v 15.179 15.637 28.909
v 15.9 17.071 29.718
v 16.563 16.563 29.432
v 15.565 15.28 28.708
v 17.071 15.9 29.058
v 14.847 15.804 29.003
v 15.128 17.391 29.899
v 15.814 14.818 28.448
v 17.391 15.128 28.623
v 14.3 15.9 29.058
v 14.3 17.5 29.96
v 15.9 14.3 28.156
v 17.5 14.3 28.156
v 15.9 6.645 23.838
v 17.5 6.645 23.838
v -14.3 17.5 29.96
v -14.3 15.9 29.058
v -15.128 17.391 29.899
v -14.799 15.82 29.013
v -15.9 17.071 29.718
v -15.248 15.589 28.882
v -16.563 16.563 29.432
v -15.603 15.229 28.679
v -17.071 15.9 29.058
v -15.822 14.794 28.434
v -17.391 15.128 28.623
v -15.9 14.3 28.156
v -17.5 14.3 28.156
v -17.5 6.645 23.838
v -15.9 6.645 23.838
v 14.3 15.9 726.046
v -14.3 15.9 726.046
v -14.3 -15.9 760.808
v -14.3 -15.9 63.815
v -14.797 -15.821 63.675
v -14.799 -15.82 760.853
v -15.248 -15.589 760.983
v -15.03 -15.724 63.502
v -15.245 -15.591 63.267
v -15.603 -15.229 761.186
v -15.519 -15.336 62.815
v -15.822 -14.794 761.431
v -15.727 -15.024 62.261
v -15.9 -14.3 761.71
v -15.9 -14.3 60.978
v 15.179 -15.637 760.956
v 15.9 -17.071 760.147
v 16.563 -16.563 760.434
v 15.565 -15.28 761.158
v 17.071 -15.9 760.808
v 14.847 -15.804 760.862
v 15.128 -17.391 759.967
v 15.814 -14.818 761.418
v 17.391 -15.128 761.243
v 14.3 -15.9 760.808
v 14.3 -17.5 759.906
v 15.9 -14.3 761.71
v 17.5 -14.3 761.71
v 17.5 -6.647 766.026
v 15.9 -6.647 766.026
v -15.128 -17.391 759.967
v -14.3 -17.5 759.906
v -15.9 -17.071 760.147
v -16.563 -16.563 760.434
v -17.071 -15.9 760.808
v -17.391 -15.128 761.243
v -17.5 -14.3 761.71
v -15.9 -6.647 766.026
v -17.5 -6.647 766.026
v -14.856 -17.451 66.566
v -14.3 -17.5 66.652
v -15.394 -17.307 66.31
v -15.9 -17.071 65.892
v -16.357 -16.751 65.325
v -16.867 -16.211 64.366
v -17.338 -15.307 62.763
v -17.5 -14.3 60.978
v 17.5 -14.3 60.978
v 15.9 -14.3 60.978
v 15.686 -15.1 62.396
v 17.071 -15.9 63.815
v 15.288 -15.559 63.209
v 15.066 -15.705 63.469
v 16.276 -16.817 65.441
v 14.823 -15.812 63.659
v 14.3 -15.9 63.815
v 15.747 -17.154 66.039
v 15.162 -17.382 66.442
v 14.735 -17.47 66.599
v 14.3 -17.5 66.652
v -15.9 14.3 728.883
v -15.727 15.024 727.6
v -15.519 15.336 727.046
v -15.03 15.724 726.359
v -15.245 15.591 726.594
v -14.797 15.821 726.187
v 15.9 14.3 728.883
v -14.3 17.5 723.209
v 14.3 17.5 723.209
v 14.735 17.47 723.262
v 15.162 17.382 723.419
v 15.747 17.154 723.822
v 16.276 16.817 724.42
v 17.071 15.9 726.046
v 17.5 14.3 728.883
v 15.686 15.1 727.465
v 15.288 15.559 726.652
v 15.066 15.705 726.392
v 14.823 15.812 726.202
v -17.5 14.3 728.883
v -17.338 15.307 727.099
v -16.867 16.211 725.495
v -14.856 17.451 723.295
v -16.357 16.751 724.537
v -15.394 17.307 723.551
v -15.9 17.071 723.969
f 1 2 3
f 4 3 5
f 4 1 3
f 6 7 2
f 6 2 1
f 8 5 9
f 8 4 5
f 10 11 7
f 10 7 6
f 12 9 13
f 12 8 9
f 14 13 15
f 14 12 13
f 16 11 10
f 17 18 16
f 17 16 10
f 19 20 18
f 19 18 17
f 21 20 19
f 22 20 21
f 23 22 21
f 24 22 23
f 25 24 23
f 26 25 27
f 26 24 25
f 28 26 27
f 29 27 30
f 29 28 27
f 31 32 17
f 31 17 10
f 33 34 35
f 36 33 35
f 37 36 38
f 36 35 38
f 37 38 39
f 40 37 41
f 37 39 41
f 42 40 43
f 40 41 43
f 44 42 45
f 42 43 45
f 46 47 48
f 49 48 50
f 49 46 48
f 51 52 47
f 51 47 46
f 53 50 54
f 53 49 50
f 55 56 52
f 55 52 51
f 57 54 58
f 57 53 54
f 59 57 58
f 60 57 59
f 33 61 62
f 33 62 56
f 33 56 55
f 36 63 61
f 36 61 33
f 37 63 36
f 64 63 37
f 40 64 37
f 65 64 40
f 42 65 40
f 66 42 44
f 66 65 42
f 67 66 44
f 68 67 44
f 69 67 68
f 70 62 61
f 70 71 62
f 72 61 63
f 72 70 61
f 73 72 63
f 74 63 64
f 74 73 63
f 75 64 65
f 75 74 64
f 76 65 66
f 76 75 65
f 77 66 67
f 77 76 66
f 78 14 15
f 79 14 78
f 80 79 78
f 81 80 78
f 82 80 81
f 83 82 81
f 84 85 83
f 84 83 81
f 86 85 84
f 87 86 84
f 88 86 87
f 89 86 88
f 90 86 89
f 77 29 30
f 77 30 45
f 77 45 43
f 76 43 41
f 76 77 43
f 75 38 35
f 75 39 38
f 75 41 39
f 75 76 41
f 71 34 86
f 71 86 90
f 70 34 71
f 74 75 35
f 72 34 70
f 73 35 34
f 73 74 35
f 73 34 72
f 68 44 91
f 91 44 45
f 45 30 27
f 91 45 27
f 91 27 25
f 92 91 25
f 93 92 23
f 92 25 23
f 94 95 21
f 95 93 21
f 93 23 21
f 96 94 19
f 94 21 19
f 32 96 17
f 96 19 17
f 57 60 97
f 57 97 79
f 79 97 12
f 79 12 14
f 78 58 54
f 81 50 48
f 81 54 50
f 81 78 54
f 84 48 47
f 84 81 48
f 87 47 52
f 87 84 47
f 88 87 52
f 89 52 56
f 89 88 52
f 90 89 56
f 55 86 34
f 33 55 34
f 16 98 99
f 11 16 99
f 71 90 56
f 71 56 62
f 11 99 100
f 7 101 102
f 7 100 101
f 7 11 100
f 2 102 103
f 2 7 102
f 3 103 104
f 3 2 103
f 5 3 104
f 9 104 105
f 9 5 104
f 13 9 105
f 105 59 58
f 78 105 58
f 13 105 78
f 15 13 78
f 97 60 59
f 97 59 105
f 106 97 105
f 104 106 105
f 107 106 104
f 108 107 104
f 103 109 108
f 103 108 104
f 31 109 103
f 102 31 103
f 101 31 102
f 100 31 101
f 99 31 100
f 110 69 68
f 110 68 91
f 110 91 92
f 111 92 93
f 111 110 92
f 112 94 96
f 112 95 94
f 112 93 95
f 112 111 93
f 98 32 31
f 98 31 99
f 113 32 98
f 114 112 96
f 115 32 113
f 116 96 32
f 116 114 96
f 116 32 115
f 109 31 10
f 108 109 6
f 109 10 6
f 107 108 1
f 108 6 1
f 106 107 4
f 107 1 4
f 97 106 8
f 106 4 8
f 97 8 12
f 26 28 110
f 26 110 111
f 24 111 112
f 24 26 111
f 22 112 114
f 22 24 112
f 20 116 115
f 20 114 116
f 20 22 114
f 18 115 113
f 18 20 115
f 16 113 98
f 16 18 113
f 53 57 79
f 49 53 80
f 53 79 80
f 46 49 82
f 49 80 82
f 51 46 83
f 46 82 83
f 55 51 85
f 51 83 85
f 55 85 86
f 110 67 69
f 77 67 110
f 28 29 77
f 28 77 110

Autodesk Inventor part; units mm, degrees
ref_plane "Start plane" through (0, 0, 4.5945) normal (0, 0, 1) x (1, 0, 0)
ref_plane "End plane" through (0, 0, 785.2713) normal (0, 0, 1) x (1, 0, 0)
sketch "Sketch" plane through (0, 0, 0) normal (0, 0, 1) x (1, 0, 0)
  line L0 (-17.5, -14.3) -> (-17.5, 14.3)
  line L1 (-14.3, 17.5) -> (14.3, 17.5)
  line L2 (17.5, 14.3) -> (17.5, -14.3)
  line L3 (14.3, -17.5) -> (-14.3, -17.5)
  arc A0 (-17.5, -14.3) -> (-14.3, -17.5) centre (-14.3, -14.3) ccw
  arc A1 (-14.3, 17.5) -> (-17.5, 14.3) centre (-14.3, 14.3) ccw
  arc A2 (17.5, 14.3) -> (14.3, 17.5) centre (14.3, 14.3) ccw
  arc A3 (14.3, -17.5) -> (17.5, -14.3) centre (14.3, -14.3) ccw
  arc A4 (-14.3, 15.9) -> (-15.9, 14.3) centre (-14.3, 14.3) ccw
  line L4 (-14.3, 15.9) -> (14.3, 15.9)
  arc A5 (15.9, 14.3) -> (14.3, 15.9) centre (14.3, 14.3) ccw
  line L5 (15.9, 14.3) -> (15.9, -14.3)
  arc A6 (14.3, -15.9) -> (15.9, -14.3) centre (14.3, -14.3) ccw
  line L6 (14.3, -15.9) -> (-14.3, -15.9)
  arc A7 (-15.9, -14.3) -> (-14.3, -15.9) centre (-14.3, -14.3) ccw
  line L7 (-15.9, -14.3) -> (-15.9, 14.3)
  line L8 (0, 25.4278) -> (0, -25.4278) construction
  line L9 (-25.4278, 0) -> (25.4278, 0) construction
  dimension "d7" = 3.2
  dimension "d10" = 35
  dimension "d11" = 35
  dimension "d12" = 1.6
  dimension "d15" = 17.5
  dimension "d16" = 17.5
extrude "Body" add sketch "Sketch" along normal up to surface (780.6769 mm away) from surface at 4.5945
sketch "Sketch3" plane through (0, 0, 0) normal (0, 0, 1) x (1, 0, 0)
  line L0 (0, 0) -> (10, 0)
ref_plane "Work Plane3" through (0, 0, 0) normal (0, -1, 0) x (1, 0, 0)
sketch "Sketch4" plane through (0, 0, 0) normal (0, -1, 0) x (1, 0, 0)
  line L0 (-2, 4.5945) -> (12, 4.5945)
  line L1 (-2, 785.2713) -> (12, 785.2713)
  dimension "d18" = 780.6769
ref_plane "Work Plane4" through (0, 8.5964, 774.6227) normal (0, -0.4912, 0.871) x (1, 0, 0)
split "Split1" plane through (0, 8.5964, 774.6227) removes the side toward (0, -0.4912, 0.871)
ref_plane "Work Plane5" through (0, -15.2431, 781.2694) normal (0, 0.871, 0.4912) x (1, 0, 0)
split "Split2" plane through (0, -15.2431, 781.2694) removes the side toward (0, 0.871, 0.4912)
ref_plane "Work Plane6" through (0, -8.5964, 15.2431) normal (0, 0.4912, -0.871) x (1, 0, 0)
split "Split3" plane through (0, -8.5964, 15.2431) removes the side toward (0, 0.4912, -0.871)
ref_plane "Work Plane7" through (0, -355.4612, 665.9277) normal (0, -0.871, -0.4912) x (1, 0, 0)
split "Split4" plane through (0, -355.4612, 665.9277) removes the side toward (0, -0.871, -0.4912)
equation "\"d7\" = G_IR"
equation "\"d10\" = G_H"
equation "\"d11\" = G_W"
equation "\"d12\" = G_T"
equation "\"d15\" = 0.5 * d10"
equation "\"d16\" = 0.5 * d11"
equation "\"d3\" = G_L"
equation "\"G_W\" = 35"
equation "\"G_H\" = 35"
equation "\"G_T\" = 1.6"
equation "\"G_IR\" = 3.2"
equation "\"G_L\" = d18"
equation "\"G_OFFSET_START\" = -4.59446"
equation "\"G_OFFSET_END\" = -4.59446"
equation "\"d13\" = -G_OFFSET_START"
equation "\"d14\" = G_OFFSET_END + B_L"
equation "\"B_L\" = 789.86581"
properties part number "AS 1163 - C350L0 35x35x1.6 SHS - 780.677" material "Steel, Mild"
